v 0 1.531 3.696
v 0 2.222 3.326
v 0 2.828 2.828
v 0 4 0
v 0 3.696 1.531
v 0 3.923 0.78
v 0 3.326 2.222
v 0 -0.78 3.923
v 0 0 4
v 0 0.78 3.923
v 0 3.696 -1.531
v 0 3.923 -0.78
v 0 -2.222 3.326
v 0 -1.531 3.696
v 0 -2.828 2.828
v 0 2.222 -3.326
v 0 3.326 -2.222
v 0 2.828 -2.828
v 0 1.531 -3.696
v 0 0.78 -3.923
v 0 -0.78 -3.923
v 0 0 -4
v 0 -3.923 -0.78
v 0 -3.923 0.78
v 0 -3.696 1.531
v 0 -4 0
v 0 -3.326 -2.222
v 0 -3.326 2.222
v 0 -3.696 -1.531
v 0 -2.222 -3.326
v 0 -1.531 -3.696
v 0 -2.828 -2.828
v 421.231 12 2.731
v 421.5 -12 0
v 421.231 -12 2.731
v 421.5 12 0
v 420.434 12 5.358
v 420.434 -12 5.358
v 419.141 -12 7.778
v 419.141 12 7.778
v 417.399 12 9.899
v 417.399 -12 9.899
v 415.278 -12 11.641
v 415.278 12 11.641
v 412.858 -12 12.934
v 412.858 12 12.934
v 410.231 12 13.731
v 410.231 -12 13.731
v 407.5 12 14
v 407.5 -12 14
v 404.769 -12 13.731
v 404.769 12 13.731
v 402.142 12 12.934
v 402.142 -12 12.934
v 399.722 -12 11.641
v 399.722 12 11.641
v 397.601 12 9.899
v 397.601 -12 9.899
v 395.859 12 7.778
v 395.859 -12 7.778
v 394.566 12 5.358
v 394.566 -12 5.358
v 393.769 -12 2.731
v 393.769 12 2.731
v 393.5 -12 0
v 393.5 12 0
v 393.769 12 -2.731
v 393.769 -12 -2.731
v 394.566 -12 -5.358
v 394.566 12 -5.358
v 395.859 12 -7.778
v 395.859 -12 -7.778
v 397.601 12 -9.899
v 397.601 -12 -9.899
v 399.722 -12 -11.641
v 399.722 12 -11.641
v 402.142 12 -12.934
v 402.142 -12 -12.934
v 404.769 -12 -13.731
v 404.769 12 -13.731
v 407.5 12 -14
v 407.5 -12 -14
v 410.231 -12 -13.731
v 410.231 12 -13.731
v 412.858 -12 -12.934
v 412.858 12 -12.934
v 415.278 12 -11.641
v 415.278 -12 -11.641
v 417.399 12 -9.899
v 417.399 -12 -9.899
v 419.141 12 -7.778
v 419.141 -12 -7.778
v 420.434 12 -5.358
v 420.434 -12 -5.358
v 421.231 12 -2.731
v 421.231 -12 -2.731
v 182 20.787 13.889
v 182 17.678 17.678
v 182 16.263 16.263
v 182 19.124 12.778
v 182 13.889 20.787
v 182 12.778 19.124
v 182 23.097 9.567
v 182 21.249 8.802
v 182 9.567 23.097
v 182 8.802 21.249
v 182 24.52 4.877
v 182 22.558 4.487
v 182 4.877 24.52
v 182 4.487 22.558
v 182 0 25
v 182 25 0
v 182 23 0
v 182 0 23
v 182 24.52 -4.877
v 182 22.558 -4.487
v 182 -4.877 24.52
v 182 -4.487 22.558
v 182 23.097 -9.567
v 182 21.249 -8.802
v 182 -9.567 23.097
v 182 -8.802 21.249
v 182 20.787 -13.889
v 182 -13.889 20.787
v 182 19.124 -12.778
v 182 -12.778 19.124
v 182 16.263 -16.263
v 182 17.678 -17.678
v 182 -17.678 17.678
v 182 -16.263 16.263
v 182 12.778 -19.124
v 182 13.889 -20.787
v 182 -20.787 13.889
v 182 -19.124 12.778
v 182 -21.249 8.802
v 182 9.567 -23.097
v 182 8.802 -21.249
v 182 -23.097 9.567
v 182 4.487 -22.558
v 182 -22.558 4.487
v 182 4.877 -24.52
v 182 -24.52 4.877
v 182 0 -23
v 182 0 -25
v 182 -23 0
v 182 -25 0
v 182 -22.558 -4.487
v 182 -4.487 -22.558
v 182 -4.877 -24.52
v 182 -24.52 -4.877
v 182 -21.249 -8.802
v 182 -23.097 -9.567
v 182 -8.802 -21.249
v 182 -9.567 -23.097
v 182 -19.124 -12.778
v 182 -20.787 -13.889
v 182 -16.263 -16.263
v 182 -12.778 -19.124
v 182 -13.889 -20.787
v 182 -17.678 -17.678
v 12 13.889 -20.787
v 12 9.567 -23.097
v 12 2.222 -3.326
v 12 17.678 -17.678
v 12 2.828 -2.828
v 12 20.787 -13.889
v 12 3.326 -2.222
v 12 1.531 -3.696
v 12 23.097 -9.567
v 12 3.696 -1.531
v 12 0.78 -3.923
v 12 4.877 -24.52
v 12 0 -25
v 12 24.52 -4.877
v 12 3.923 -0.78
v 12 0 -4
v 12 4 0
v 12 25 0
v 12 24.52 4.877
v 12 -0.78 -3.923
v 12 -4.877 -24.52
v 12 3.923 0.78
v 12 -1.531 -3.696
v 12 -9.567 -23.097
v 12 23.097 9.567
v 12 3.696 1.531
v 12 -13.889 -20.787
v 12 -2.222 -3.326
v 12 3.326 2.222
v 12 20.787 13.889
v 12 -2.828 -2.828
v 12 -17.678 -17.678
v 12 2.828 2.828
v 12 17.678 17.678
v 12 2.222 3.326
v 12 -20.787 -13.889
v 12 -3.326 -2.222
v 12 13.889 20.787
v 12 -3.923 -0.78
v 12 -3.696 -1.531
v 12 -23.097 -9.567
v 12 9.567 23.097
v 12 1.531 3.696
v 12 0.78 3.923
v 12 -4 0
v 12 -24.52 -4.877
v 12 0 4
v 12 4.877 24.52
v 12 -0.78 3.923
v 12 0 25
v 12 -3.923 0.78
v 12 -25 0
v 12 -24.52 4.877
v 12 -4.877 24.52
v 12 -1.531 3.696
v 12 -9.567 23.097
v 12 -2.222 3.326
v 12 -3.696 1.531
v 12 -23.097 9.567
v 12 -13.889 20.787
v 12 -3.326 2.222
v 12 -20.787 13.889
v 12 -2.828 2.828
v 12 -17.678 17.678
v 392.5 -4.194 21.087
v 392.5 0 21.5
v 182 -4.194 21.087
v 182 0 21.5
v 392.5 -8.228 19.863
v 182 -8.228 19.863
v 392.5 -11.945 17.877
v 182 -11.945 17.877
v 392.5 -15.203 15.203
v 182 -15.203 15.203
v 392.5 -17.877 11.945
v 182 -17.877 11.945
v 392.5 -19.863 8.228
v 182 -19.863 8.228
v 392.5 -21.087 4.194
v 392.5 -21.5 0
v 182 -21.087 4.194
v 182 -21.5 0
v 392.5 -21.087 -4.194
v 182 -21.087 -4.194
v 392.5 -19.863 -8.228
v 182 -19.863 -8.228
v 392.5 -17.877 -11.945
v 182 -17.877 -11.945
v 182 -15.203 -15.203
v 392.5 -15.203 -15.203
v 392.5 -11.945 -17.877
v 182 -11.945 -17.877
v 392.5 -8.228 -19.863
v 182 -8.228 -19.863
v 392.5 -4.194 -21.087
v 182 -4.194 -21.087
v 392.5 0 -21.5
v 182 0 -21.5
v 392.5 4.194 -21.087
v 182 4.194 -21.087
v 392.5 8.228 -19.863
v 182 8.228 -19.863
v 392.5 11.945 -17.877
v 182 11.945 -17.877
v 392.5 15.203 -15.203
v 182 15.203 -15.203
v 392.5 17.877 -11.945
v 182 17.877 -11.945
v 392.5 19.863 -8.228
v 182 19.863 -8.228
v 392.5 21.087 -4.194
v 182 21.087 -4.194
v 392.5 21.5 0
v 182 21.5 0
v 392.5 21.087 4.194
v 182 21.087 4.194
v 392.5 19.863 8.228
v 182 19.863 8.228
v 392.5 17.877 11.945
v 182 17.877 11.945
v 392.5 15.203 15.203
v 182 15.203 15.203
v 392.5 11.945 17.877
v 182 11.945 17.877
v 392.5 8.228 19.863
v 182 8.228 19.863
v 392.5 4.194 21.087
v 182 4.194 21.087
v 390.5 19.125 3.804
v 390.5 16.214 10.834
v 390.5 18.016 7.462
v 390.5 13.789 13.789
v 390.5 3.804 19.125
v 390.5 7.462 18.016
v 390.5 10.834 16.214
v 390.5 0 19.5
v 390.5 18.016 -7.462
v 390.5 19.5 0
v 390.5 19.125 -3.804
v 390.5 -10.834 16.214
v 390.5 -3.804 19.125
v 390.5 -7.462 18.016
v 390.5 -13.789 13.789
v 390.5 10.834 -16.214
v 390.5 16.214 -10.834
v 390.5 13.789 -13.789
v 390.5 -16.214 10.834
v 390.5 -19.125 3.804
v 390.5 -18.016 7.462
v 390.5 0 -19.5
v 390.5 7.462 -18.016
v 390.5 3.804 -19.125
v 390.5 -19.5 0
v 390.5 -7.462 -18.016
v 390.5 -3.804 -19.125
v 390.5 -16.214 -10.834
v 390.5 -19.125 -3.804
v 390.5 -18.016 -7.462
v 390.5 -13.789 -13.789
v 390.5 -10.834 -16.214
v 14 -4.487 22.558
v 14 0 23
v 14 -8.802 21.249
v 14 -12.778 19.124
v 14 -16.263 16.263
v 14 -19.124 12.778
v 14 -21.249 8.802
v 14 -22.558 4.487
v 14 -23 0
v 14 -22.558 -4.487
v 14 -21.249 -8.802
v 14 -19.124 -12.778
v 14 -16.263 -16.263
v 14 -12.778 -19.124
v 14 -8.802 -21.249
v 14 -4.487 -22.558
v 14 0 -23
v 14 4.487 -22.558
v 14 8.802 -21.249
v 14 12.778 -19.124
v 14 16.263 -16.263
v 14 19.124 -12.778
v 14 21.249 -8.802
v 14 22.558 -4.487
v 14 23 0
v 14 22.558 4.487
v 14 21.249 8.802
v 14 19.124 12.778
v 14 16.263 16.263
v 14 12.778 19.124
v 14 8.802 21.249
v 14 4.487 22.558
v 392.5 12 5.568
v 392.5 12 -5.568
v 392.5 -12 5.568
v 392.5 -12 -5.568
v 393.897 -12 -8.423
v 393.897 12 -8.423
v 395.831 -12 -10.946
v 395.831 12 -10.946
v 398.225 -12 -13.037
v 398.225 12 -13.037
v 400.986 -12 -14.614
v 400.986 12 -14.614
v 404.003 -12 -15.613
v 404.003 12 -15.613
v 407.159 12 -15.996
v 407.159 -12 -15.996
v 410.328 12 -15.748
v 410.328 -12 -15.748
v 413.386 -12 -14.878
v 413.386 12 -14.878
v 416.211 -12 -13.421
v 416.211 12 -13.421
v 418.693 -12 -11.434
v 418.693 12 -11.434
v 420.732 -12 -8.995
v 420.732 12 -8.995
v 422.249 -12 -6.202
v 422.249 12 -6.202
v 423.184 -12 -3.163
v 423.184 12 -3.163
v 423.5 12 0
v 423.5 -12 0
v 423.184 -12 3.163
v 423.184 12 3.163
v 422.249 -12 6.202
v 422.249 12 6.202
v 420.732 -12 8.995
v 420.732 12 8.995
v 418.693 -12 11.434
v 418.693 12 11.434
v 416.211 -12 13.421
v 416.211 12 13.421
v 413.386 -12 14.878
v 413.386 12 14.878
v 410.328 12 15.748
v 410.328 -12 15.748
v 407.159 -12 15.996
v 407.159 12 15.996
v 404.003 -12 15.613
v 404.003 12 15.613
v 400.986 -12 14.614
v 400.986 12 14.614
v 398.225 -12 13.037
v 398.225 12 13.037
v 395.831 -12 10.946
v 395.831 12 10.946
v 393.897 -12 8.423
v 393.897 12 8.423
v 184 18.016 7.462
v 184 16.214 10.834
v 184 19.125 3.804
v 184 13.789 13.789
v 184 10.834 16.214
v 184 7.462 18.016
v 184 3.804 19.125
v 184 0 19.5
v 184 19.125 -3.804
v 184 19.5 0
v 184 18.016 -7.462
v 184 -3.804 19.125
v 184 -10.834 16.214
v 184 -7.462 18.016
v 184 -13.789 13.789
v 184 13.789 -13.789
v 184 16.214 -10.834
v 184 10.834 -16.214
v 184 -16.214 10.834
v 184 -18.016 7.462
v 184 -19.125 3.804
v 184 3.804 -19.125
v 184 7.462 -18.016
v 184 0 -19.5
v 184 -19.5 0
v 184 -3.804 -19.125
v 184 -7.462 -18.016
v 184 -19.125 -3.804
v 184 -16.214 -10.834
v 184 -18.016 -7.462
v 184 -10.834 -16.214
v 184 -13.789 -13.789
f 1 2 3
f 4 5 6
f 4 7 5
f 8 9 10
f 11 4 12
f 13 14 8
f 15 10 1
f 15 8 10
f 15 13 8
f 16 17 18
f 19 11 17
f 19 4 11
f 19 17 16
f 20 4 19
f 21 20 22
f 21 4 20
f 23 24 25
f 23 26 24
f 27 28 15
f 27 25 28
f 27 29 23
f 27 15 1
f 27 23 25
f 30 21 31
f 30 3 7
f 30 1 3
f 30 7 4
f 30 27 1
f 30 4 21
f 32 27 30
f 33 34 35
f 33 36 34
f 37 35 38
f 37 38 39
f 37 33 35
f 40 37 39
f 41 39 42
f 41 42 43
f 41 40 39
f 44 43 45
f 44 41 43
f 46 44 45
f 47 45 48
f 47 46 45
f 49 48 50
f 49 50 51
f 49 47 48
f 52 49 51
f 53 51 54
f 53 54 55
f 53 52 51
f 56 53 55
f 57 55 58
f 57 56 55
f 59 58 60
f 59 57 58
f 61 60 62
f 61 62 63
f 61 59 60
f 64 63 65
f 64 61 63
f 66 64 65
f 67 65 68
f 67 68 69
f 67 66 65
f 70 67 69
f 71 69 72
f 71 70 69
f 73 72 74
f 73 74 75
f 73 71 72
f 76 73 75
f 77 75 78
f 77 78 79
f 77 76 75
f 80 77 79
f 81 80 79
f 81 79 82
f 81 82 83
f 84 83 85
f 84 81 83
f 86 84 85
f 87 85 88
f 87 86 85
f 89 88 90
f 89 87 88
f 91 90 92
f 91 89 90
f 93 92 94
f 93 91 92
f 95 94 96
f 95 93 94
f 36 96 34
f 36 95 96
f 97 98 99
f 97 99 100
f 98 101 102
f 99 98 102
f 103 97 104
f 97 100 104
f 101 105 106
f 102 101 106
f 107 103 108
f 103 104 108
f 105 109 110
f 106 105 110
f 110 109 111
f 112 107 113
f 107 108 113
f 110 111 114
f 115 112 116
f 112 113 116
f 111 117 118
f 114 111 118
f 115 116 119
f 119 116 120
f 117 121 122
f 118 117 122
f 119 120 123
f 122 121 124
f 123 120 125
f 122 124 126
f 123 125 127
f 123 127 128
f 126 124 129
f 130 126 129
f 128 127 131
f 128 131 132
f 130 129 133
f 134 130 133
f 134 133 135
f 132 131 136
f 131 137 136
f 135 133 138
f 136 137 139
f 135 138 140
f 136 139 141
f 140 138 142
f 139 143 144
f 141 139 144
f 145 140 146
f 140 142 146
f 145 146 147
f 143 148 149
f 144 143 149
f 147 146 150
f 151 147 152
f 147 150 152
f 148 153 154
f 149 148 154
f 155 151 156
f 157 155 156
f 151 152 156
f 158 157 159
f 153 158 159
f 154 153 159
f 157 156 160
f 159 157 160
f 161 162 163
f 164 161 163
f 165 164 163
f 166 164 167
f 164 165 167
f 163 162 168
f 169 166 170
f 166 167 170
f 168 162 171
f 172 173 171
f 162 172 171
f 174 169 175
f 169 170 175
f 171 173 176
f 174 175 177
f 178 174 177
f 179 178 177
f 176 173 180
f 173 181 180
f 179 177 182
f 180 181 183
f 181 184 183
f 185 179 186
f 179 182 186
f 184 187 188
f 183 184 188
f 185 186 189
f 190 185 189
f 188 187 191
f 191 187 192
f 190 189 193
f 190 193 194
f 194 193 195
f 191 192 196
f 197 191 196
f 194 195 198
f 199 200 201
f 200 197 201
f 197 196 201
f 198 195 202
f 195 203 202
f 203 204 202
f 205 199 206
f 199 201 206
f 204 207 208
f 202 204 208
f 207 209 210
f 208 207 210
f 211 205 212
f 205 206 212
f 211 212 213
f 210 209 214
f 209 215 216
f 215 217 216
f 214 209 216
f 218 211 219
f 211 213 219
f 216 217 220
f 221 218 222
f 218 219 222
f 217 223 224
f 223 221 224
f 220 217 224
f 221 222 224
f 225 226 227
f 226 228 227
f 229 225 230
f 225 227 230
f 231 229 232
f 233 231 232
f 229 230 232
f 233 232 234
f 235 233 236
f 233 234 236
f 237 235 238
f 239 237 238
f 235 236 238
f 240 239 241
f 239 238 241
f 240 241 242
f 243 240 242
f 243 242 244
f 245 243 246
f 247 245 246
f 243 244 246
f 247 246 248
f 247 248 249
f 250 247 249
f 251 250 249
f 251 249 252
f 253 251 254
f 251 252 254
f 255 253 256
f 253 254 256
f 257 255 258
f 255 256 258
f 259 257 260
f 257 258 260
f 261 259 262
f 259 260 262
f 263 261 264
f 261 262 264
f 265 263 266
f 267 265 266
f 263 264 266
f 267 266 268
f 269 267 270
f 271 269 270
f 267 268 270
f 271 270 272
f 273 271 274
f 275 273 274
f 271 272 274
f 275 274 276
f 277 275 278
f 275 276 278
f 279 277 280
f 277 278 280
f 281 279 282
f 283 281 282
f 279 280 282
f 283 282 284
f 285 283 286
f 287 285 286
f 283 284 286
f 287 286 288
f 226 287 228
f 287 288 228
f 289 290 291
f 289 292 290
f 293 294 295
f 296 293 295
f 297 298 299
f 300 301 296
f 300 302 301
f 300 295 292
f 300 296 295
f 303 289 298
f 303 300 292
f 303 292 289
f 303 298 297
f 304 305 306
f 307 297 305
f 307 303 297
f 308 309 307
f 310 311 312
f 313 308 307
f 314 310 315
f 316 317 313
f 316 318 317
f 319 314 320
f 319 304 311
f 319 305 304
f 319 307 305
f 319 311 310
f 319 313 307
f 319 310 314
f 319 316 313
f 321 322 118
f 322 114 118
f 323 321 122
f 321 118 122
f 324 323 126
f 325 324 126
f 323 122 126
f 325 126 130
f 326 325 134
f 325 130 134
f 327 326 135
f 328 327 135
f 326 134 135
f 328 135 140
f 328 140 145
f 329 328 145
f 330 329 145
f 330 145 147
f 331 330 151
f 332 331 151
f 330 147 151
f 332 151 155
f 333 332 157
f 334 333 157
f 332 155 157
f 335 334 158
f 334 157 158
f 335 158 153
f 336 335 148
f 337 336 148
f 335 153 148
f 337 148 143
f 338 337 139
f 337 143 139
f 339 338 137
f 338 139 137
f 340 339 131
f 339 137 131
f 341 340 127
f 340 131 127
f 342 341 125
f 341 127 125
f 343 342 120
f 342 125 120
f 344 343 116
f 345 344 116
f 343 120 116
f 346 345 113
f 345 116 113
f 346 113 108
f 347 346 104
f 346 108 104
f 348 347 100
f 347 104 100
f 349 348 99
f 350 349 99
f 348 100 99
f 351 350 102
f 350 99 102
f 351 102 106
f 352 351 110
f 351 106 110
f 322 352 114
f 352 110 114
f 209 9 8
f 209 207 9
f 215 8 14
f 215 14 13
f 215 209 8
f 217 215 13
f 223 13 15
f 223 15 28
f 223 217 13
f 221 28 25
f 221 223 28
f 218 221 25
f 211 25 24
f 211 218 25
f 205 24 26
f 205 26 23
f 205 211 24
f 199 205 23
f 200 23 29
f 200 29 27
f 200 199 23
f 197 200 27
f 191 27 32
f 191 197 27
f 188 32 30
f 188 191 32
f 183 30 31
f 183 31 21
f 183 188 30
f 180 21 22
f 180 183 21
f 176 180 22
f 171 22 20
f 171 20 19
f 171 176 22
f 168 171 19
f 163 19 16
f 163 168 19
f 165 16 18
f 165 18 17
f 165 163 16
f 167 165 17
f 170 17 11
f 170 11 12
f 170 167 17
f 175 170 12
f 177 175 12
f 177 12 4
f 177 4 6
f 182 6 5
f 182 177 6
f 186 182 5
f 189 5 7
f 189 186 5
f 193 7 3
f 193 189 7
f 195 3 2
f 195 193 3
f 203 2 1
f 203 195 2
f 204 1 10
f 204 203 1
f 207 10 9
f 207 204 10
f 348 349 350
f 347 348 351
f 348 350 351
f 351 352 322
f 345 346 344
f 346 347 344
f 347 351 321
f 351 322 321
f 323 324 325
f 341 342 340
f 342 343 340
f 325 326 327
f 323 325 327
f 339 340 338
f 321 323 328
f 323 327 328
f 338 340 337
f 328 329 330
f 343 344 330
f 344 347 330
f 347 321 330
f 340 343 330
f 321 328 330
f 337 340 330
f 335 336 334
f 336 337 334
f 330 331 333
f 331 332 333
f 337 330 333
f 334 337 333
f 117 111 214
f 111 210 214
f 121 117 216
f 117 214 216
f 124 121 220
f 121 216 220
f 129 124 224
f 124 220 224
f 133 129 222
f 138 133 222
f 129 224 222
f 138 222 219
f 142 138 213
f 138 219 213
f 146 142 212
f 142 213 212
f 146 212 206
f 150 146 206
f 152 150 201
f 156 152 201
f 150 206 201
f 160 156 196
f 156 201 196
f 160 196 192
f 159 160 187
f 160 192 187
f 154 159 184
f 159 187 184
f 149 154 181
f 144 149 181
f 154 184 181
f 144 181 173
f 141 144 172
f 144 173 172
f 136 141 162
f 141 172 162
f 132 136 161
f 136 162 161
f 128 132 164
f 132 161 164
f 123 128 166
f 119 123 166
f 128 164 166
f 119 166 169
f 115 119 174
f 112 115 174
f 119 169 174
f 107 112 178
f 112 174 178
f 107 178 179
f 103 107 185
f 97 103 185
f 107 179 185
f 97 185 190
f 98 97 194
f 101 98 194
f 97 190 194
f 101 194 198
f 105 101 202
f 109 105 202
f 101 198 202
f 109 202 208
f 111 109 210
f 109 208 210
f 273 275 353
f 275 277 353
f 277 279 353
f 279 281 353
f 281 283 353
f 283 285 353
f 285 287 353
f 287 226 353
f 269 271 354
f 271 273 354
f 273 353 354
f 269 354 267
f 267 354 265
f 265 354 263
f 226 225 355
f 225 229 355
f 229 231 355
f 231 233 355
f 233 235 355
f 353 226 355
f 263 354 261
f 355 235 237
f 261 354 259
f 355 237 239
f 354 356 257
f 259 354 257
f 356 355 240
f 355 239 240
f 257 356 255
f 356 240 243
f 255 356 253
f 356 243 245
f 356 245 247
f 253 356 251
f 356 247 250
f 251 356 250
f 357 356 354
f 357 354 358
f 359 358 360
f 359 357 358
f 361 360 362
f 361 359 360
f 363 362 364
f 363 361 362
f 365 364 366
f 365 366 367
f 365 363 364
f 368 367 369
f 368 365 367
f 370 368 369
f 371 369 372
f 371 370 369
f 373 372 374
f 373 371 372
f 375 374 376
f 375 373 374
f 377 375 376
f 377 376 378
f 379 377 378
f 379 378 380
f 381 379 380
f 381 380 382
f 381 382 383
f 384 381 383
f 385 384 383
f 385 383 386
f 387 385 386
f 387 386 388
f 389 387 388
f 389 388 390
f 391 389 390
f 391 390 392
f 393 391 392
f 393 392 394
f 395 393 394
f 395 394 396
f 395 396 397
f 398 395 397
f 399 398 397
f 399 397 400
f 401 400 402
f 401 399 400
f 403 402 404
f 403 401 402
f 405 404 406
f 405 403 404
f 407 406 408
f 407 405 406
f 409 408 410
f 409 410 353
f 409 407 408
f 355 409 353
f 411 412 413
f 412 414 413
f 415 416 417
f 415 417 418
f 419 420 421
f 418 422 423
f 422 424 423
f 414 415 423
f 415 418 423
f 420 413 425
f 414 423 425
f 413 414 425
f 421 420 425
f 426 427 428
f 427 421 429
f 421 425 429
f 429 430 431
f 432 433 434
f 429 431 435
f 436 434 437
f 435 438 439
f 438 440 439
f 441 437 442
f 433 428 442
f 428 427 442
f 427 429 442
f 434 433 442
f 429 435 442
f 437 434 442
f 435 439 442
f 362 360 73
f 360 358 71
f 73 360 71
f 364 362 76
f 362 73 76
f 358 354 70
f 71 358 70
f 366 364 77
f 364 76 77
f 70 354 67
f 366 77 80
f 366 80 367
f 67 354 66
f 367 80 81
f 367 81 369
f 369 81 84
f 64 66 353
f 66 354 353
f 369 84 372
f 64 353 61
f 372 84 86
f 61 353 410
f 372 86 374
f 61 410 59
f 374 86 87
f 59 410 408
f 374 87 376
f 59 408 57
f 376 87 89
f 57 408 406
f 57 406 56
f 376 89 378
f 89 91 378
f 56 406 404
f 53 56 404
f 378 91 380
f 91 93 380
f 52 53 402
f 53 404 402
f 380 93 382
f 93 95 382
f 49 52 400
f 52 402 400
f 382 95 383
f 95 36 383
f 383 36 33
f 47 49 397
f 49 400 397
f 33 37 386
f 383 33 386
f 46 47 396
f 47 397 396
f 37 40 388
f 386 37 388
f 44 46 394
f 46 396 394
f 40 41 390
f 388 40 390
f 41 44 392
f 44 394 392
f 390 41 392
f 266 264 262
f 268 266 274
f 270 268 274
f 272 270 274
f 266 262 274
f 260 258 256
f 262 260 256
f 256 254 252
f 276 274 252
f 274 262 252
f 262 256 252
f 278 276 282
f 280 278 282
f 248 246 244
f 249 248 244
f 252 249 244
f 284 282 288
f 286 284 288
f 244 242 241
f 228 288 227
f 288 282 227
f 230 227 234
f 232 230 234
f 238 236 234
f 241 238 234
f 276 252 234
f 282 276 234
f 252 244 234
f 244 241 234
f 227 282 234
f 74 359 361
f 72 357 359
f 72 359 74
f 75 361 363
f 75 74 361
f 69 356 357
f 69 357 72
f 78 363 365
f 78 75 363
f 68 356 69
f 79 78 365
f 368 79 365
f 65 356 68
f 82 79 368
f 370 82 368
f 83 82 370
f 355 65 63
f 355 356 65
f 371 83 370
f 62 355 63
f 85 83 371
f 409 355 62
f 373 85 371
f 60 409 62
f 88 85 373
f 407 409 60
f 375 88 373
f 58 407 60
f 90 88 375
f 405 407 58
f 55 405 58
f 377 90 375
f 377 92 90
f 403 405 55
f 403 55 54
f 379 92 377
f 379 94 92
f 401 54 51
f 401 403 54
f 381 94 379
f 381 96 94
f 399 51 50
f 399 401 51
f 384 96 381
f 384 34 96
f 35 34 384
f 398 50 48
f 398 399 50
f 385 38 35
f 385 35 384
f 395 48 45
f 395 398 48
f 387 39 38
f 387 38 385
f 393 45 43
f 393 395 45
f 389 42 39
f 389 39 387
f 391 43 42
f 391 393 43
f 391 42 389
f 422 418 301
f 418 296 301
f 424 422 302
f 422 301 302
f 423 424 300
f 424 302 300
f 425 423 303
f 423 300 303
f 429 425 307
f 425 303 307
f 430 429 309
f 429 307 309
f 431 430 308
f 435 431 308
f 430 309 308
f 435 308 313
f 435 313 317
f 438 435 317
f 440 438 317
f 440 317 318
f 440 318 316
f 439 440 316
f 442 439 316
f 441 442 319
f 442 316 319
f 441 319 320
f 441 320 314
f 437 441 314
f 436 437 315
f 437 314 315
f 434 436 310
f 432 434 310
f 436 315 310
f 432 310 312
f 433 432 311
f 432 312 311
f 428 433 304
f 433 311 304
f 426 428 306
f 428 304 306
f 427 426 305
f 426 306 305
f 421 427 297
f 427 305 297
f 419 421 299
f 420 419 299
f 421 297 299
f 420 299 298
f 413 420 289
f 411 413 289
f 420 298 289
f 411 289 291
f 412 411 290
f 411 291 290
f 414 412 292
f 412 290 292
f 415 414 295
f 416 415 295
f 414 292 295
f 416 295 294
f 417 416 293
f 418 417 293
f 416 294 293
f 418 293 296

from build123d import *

# Parameters (mm, degrees)
F0_W     = 12
F0_H     = 4
F0_W_2   = 2
F0_H_2   = 12.5
F0_H_3   = 7
F0_H_4   = 19.5
F2_R     = 16
F2_R_2   = 14
F3_DEPTH = 12


with BuildPart() as f1:
    # F0 (on Front) → F1 (revolve)
    with BuildSketch(Plane.XZ):
        Polygon((392.5, 21.5), (182, 21.5), (182, 19.5), (184, 19.5), (390.5, 19.5), (392.5, 19.5), align=None)
        with Locations((6, 2)):
            Rectangle(F0_W, F0_H)
        Polygon((12, 4), (12, 0), (14, 0), (14, 23), (12, 23), align=None)
        Polygon((12, 25), (12, 23), (14, 23), (182, 23), (182, 25), align=None)
        with Locations((183, 13.25)):
            Rectangle(F0_W_2, F0_H_2)
        with Locations((183, 3.5)):
            Rectangle(F0_W_2, F0_H_3)
        with Locations((391.5, 9.75)):
            Rectangle(F0_W_2, F0_H_4)
    revolve(axis=Axis((250, 0, 0), (1, 0, 0)))

    # F2 (on Front) → F3 (join, symmetric)
    with BuildSketch(Plane.XZ):
        with Locations((407.5, 0)):
            Circle(F2_R)
        with Locations((407.5, 0)):
            Circle(F2_R_2, mode=Mode.SUBTRACT)
    extrude(amount=F3_DEPTH, both=True)


solid = f1.part
